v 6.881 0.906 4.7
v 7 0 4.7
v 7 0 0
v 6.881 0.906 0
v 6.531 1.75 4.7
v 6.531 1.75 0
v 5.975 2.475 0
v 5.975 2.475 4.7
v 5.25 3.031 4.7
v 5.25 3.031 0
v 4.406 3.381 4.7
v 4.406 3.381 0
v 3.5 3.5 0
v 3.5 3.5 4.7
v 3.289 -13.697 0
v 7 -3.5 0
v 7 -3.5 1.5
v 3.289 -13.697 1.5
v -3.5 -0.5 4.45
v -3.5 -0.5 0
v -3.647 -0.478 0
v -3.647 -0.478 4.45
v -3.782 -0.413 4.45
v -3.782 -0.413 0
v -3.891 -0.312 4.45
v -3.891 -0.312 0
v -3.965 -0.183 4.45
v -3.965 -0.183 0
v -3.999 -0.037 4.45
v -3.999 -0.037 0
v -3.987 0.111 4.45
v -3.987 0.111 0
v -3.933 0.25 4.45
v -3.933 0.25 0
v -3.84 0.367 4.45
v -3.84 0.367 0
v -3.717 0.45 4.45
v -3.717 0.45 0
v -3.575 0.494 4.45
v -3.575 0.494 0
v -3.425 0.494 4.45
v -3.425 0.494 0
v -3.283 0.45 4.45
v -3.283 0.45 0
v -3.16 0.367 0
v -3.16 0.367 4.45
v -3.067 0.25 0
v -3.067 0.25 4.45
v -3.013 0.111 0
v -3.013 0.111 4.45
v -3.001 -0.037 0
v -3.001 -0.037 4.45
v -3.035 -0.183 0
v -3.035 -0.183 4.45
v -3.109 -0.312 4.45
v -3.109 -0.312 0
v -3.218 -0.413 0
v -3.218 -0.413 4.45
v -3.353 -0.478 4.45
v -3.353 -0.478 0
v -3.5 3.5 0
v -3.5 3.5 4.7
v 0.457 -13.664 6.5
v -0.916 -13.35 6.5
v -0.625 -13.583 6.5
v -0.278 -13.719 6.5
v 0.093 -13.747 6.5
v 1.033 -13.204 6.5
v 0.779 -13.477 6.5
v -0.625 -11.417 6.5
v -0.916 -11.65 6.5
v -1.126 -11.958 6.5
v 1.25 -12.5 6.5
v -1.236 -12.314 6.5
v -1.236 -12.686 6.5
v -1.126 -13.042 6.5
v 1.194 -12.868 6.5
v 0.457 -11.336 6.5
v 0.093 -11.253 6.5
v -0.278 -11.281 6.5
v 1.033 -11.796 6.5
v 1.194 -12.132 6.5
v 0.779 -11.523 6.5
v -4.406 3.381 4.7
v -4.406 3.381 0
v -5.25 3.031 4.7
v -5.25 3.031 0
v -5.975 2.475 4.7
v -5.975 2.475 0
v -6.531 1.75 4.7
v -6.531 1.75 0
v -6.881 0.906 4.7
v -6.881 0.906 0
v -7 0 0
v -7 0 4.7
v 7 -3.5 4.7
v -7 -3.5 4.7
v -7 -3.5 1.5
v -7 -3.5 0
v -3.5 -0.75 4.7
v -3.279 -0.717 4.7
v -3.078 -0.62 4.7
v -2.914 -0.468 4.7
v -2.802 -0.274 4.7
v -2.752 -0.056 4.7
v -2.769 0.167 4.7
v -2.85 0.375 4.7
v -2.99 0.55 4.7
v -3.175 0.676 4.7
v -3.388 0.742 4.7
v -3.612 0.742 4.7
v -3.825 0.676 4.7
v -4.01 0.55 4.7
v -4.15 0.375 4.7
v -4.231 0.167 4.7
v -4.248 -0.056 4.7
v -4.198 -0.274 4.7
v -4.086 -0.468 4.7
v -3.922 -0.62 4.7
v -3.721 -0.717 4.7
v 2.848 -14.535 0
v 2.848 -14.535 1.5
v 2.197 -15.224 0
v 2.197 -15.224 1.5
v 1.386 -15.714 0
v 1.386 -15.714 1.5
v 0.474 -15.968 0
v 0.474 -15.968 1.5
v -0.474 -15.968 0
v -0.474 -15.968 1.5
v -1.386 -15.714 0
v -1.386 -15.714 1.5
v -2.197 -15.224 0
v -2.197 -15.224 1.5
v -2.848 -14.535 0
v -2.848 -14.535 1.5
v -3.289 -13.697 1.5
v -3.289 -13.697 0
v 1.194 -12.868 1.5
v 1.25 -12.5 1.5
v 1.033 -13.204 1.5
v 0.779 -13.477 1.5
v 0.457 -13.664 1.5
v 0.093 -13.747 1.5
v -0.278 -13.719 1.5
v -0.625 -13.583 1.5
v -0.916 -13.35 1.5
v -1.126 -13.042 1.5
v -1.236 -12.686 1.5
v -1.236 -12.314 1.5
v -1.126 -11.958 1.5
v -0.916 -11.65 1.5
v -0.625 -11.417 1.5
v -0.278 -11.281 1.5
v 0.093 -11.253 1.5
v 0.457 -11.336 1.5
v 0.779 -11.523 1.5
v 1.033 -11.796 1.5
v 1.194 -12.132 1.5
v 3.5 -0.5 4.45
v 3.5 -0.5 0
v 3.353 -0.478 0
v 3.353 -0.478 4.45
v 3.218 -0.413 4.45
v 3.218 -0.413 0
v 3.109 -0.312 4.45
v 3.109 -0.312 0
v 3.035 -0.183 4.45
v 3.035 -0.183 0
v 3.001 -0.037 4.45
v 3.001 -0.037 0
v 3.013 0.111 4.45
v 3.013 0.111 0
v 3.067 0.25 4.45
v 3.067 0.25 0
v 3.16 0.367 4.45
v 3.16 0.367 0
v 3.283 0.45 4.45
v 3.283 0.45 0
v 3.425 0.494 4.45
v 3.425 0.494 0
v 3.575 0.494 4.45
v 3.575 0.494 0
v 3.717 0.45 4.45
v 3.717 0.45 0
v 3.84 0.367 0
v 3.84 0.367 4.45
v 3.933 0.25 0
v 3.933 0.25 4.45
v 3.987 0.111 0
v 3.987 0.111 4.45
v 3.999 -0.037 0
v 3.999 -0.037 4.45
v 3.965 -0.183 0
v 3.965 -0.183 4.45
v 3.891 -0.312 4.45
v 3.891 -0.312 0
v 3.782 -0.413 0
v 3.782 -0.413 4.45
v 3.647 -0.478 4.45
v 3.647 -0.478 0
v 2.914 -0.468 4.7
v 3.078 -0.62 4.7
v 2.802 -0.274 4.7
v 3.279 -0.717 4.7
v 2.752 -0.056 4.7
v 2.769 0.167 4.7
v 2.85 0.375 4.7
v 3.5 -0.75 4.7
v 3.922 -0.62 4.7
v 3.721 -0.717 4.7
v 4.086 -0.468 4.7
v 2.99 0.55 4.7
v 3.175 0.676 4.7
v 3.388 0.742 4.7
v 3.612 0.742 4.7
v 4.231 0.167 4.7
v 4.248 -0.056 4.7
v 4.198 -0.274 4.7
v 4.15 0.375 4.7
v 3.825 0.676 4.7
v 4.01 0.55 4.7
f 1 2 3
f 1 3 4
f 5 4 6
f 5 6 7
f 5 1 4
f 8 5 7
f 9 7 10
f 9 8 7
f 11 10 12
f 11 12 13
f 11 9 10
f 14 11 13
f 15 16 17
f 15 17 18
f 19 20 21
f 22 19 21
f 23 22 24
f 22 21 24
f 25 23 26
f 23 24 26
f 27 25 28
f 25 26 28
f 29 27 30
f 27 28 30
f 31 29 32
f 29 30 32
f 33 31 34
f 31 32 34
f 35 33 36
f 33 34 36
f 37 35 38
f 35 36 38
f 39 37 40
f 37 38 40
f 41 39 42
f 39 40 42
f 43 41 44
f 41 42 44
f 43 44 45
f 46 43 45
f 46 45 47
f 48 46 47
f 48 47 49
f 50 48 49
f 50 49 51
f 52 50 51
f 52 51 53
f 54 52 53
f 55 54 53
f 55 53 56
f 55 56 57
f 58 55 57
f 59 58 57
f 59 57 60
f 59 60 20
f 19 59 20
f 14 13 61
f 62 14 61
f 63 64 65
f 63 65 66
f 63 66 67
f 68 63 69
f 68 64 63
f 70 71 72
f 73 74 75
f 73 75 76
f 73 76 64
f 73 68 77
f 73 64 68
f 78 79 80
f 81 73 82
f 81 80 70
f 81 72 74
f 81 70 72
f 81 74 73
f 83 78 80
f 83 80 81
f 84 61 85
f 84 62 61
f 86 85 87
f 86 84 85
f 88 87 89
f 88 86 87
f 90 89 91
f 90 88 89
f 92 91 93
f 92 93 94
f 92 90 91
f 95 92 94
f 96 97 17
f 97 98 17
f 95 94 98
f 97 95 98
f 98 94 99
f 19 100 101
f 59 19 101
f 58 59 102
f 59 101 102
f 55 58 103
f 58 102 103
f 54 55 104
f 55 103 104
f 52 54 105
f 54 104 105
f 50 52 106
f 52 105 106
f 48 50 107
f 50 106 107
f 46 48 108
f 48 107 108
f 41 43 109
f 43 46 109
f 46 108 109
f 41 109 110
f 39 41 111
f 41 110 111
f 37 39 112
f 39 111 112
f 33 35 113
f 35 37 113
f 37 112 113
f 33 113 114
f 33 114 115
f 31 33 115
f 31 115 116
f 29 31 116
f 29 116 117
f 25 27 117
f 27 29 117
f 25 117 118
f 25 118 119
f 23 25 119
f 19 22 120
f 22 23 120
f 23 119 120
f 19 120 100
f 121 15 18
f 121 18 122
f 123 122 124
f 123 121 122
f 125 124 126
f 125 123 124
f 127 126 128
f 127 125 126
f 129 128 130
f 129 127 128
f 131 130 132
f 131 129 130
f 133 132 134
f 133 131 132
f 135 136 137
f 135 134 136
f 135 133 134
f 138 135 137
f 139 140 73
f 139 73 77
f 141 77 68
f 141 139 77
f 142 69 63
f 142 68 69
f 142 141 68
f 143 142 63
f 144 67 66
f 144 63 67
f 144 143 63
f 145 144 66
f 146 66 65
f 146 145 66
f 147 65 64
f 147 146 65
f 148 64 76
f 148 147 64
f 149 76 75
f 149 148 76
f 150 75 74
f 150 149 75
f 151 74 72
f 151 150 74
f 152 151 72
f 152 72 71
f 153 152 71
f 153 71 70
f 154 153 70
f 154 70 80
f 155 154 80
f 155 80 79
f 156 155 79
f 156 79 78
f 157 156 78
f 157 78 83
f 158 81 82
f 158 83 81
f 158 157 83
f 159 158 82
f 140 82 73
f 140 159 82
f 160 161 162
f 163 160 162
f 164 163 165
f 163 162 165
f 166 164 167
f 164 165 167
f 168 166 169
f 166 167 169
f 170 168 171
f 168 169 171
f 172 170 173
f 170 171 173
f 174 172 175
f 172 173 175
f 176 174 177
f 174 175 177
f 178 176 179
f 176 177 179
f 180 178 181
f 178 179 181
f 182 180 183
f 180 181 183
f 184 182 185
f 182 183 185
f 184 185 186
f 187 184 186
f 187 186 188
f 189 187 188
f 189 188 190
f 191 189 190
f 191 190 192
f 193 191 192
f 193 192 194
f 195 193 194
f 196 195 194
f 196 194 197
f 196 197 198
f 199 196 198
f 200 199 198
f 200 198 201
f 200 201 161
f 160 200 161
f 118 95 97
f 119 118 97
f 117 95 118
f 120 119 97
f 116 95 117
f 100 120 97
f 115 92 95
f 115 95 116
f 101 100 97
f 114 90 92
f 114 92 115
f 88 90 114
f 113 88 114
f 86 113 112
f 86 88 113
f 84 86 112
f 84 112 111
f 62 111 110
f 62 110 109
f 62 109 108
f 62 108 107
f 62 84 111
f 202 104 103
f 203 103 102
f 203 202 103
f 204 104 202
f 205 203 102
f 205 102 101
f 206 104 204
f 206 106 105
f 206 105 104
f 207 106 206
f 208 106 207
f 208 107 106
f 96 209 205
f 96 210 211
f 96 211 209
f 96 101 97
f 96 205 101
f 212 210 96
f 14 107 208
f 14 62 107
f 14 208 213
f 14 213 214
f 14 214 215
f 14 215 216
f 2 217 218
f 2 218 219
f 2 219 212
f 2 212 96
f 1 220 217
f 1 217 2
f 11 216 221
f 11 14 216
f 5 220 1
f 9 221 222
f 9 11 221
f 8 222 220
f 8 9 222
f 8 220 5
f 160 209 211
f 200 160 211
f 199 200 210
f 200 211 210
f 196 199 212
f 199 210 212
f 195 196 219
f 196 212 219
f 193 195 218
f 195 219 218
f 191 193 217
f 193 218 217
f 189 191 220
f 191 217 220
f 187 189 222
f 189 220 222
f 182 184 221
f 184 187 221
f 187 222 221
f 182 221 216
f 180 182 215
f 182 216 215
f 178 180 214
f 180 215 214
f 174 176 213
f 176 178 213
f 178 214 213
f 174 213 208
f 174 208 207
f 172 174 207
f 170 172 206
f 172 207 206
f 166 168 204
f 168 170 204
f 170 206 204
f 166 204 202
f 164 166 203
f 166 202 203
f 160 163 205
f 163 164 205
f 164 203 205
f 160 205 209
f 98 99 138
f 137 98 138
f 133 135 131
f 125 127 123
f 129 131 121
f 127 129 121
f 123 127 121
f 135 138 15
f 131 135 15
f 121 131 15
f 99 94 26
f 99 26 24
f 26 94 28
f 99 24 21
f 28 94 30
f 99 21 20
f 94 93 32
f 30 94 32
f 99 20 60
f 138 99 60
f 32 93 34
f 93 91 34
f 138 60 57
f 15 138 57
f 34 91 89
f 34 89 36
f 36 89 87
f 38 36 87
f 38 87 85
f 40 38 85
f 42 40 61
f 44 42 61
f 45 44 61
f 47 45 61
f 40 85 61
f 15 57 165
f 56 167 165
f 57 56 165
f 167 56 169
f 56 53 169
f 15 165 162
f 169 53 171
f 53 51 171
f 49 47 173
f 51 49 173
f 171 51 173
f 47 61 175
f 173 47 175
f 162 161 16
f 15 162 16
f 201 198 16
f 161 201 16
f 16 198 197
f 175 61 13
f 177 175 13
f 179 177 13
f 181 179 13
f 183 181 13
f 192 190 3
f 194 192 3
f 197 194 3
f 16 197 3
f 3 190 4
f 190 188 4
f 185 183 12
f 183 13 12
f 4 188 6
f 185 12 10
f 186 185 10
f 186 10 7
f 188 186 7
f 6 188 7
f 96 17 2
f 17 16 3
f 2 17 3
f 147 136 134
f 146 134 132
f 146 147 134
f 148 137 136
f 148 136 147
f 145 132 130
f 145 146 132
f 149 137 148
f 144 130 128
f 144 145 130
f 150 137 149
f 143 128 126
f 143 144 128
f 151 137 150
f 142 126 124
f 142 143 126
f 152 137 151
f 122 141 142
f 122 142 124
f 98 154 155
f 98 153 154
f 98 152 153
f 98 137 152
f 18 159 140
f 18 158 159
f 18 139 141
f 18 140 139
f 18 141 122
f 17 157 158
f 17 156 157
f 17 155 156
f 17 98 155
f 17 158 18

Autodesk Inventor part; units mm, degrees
ref_plane "YZ Plane" through (0, 0, 0) normal (1, 0, 0) x (0, 1, 0)
ref_plane "XZ Plane" through (0, 0, 0) normal (0, 1, 0) x (-1, 0, 0)
ref_plane "XY Plane" through (0, 0, 0) normal (0, 0, 1) x (1, 0, 0)
sketch "Эскиз1" plane through (0, 0, 0) normal (0, 0, 1) x (1, 0, 0)
  line L0 (-7, -3.5) -> (7, -3.5) construction
  line L1 (7, -3.5) -> (7, 3.5)
  line L2 (7, 3.5) -> (-7, 3.5)
  line L3 (-7, 3.5) -> (-7, -3.5)
  line L4 (-7, -3.5) -> (7, 3.5) construction
  line L5 (7, -3.5) -> (-7, 3.5) construction
  line L6 (0, -3.5) -> (0, -12.5) construction
  line L7 (-7, -3.5) -> (-3.289, -13.697)
  line L8 (7, -3.5) -> (3.289, -13.697)
  arc A0 (-3.289, -13.697) -> (3.289, -13.697) centre (0, -12.5) ccw
  point P0 (0, 0)
  point P1 (0, 0)
  point P2 (0, 0)
  point P3 (0, 0)
  dimension "d0" = 14
  dimension "d1" = 7
  dimension "d4" = 9
  dimension "d5" = 3.5
extrude "Выдавливание1" add sketch "Эскиз1" along normal blind 1.5
sketch "Эскиз4" plane through (0, 0, 1.5) normal (0, 0, 1) x (1, 0, 0)
  line L0 (7, 3.5) -> (-7, 3.5) projected
  line L1 (7, -3.5) -> (7, 3.5) projected
  line L2 (-7, 3.5) -> (-7, -3.5) projected
  line L3 (-7, -3.5) -> (7, -3.5)
  point P0 (0, 0)
extrude "Выдавливание6" add sketch "Эскиз4" along normal blind 3.2
sketch "Эскиз2" plane through (0, 0, 1.5) normal (0, 0, 1) x (1, 0, 0)
  arc A0 (-3.289, -13.697) -> (3.289, -13.697) centre (0, -12.5) ccw construction
  circle A1 centre (0, -12.5) radius 1.25
  point P0 (0, 0)
  dimension "d8" = 2.5
extrude "Выдавливание9" add sketch "Эскиз2" along normal blind 5
fillet "Сопряжение1" radius 3.5 2 edges at (7, 3.5, 2.35) (-7, 3.5, 2.35)
sketch "Эскиз5" plane through (0, 0, 4.7) normal (0, 0, 1) x (1, 0, 0)
  circle A0 centre (0, -9.5) radius 1.5 construction
  line L0 (7, -3.5) -> (-7, -3.5) construction
  line L1 (0, -3.5) -> (0, 3.5) construction
  line L2 (-7, 3.5) -> (7, 3.5) construction
  circle A1 centre (3.5, 0) radius 0.5
  line L3 (3.5, 3.5) -> (3.5, 0) construction
  line L4 (3.5, 0) -> (0, 0) construction
  circle A2 centre (-3.5, 0) radius 0.5
  dimension "d34" = 1
hole "Отверстие1" at (-3.5, 0, 4.7) at (3.5, 0, 4.7) direction (0, 0, -1) diameter 1 end through all countersink diameter 1.5 countersink angle 90
properties part number "переходник"
